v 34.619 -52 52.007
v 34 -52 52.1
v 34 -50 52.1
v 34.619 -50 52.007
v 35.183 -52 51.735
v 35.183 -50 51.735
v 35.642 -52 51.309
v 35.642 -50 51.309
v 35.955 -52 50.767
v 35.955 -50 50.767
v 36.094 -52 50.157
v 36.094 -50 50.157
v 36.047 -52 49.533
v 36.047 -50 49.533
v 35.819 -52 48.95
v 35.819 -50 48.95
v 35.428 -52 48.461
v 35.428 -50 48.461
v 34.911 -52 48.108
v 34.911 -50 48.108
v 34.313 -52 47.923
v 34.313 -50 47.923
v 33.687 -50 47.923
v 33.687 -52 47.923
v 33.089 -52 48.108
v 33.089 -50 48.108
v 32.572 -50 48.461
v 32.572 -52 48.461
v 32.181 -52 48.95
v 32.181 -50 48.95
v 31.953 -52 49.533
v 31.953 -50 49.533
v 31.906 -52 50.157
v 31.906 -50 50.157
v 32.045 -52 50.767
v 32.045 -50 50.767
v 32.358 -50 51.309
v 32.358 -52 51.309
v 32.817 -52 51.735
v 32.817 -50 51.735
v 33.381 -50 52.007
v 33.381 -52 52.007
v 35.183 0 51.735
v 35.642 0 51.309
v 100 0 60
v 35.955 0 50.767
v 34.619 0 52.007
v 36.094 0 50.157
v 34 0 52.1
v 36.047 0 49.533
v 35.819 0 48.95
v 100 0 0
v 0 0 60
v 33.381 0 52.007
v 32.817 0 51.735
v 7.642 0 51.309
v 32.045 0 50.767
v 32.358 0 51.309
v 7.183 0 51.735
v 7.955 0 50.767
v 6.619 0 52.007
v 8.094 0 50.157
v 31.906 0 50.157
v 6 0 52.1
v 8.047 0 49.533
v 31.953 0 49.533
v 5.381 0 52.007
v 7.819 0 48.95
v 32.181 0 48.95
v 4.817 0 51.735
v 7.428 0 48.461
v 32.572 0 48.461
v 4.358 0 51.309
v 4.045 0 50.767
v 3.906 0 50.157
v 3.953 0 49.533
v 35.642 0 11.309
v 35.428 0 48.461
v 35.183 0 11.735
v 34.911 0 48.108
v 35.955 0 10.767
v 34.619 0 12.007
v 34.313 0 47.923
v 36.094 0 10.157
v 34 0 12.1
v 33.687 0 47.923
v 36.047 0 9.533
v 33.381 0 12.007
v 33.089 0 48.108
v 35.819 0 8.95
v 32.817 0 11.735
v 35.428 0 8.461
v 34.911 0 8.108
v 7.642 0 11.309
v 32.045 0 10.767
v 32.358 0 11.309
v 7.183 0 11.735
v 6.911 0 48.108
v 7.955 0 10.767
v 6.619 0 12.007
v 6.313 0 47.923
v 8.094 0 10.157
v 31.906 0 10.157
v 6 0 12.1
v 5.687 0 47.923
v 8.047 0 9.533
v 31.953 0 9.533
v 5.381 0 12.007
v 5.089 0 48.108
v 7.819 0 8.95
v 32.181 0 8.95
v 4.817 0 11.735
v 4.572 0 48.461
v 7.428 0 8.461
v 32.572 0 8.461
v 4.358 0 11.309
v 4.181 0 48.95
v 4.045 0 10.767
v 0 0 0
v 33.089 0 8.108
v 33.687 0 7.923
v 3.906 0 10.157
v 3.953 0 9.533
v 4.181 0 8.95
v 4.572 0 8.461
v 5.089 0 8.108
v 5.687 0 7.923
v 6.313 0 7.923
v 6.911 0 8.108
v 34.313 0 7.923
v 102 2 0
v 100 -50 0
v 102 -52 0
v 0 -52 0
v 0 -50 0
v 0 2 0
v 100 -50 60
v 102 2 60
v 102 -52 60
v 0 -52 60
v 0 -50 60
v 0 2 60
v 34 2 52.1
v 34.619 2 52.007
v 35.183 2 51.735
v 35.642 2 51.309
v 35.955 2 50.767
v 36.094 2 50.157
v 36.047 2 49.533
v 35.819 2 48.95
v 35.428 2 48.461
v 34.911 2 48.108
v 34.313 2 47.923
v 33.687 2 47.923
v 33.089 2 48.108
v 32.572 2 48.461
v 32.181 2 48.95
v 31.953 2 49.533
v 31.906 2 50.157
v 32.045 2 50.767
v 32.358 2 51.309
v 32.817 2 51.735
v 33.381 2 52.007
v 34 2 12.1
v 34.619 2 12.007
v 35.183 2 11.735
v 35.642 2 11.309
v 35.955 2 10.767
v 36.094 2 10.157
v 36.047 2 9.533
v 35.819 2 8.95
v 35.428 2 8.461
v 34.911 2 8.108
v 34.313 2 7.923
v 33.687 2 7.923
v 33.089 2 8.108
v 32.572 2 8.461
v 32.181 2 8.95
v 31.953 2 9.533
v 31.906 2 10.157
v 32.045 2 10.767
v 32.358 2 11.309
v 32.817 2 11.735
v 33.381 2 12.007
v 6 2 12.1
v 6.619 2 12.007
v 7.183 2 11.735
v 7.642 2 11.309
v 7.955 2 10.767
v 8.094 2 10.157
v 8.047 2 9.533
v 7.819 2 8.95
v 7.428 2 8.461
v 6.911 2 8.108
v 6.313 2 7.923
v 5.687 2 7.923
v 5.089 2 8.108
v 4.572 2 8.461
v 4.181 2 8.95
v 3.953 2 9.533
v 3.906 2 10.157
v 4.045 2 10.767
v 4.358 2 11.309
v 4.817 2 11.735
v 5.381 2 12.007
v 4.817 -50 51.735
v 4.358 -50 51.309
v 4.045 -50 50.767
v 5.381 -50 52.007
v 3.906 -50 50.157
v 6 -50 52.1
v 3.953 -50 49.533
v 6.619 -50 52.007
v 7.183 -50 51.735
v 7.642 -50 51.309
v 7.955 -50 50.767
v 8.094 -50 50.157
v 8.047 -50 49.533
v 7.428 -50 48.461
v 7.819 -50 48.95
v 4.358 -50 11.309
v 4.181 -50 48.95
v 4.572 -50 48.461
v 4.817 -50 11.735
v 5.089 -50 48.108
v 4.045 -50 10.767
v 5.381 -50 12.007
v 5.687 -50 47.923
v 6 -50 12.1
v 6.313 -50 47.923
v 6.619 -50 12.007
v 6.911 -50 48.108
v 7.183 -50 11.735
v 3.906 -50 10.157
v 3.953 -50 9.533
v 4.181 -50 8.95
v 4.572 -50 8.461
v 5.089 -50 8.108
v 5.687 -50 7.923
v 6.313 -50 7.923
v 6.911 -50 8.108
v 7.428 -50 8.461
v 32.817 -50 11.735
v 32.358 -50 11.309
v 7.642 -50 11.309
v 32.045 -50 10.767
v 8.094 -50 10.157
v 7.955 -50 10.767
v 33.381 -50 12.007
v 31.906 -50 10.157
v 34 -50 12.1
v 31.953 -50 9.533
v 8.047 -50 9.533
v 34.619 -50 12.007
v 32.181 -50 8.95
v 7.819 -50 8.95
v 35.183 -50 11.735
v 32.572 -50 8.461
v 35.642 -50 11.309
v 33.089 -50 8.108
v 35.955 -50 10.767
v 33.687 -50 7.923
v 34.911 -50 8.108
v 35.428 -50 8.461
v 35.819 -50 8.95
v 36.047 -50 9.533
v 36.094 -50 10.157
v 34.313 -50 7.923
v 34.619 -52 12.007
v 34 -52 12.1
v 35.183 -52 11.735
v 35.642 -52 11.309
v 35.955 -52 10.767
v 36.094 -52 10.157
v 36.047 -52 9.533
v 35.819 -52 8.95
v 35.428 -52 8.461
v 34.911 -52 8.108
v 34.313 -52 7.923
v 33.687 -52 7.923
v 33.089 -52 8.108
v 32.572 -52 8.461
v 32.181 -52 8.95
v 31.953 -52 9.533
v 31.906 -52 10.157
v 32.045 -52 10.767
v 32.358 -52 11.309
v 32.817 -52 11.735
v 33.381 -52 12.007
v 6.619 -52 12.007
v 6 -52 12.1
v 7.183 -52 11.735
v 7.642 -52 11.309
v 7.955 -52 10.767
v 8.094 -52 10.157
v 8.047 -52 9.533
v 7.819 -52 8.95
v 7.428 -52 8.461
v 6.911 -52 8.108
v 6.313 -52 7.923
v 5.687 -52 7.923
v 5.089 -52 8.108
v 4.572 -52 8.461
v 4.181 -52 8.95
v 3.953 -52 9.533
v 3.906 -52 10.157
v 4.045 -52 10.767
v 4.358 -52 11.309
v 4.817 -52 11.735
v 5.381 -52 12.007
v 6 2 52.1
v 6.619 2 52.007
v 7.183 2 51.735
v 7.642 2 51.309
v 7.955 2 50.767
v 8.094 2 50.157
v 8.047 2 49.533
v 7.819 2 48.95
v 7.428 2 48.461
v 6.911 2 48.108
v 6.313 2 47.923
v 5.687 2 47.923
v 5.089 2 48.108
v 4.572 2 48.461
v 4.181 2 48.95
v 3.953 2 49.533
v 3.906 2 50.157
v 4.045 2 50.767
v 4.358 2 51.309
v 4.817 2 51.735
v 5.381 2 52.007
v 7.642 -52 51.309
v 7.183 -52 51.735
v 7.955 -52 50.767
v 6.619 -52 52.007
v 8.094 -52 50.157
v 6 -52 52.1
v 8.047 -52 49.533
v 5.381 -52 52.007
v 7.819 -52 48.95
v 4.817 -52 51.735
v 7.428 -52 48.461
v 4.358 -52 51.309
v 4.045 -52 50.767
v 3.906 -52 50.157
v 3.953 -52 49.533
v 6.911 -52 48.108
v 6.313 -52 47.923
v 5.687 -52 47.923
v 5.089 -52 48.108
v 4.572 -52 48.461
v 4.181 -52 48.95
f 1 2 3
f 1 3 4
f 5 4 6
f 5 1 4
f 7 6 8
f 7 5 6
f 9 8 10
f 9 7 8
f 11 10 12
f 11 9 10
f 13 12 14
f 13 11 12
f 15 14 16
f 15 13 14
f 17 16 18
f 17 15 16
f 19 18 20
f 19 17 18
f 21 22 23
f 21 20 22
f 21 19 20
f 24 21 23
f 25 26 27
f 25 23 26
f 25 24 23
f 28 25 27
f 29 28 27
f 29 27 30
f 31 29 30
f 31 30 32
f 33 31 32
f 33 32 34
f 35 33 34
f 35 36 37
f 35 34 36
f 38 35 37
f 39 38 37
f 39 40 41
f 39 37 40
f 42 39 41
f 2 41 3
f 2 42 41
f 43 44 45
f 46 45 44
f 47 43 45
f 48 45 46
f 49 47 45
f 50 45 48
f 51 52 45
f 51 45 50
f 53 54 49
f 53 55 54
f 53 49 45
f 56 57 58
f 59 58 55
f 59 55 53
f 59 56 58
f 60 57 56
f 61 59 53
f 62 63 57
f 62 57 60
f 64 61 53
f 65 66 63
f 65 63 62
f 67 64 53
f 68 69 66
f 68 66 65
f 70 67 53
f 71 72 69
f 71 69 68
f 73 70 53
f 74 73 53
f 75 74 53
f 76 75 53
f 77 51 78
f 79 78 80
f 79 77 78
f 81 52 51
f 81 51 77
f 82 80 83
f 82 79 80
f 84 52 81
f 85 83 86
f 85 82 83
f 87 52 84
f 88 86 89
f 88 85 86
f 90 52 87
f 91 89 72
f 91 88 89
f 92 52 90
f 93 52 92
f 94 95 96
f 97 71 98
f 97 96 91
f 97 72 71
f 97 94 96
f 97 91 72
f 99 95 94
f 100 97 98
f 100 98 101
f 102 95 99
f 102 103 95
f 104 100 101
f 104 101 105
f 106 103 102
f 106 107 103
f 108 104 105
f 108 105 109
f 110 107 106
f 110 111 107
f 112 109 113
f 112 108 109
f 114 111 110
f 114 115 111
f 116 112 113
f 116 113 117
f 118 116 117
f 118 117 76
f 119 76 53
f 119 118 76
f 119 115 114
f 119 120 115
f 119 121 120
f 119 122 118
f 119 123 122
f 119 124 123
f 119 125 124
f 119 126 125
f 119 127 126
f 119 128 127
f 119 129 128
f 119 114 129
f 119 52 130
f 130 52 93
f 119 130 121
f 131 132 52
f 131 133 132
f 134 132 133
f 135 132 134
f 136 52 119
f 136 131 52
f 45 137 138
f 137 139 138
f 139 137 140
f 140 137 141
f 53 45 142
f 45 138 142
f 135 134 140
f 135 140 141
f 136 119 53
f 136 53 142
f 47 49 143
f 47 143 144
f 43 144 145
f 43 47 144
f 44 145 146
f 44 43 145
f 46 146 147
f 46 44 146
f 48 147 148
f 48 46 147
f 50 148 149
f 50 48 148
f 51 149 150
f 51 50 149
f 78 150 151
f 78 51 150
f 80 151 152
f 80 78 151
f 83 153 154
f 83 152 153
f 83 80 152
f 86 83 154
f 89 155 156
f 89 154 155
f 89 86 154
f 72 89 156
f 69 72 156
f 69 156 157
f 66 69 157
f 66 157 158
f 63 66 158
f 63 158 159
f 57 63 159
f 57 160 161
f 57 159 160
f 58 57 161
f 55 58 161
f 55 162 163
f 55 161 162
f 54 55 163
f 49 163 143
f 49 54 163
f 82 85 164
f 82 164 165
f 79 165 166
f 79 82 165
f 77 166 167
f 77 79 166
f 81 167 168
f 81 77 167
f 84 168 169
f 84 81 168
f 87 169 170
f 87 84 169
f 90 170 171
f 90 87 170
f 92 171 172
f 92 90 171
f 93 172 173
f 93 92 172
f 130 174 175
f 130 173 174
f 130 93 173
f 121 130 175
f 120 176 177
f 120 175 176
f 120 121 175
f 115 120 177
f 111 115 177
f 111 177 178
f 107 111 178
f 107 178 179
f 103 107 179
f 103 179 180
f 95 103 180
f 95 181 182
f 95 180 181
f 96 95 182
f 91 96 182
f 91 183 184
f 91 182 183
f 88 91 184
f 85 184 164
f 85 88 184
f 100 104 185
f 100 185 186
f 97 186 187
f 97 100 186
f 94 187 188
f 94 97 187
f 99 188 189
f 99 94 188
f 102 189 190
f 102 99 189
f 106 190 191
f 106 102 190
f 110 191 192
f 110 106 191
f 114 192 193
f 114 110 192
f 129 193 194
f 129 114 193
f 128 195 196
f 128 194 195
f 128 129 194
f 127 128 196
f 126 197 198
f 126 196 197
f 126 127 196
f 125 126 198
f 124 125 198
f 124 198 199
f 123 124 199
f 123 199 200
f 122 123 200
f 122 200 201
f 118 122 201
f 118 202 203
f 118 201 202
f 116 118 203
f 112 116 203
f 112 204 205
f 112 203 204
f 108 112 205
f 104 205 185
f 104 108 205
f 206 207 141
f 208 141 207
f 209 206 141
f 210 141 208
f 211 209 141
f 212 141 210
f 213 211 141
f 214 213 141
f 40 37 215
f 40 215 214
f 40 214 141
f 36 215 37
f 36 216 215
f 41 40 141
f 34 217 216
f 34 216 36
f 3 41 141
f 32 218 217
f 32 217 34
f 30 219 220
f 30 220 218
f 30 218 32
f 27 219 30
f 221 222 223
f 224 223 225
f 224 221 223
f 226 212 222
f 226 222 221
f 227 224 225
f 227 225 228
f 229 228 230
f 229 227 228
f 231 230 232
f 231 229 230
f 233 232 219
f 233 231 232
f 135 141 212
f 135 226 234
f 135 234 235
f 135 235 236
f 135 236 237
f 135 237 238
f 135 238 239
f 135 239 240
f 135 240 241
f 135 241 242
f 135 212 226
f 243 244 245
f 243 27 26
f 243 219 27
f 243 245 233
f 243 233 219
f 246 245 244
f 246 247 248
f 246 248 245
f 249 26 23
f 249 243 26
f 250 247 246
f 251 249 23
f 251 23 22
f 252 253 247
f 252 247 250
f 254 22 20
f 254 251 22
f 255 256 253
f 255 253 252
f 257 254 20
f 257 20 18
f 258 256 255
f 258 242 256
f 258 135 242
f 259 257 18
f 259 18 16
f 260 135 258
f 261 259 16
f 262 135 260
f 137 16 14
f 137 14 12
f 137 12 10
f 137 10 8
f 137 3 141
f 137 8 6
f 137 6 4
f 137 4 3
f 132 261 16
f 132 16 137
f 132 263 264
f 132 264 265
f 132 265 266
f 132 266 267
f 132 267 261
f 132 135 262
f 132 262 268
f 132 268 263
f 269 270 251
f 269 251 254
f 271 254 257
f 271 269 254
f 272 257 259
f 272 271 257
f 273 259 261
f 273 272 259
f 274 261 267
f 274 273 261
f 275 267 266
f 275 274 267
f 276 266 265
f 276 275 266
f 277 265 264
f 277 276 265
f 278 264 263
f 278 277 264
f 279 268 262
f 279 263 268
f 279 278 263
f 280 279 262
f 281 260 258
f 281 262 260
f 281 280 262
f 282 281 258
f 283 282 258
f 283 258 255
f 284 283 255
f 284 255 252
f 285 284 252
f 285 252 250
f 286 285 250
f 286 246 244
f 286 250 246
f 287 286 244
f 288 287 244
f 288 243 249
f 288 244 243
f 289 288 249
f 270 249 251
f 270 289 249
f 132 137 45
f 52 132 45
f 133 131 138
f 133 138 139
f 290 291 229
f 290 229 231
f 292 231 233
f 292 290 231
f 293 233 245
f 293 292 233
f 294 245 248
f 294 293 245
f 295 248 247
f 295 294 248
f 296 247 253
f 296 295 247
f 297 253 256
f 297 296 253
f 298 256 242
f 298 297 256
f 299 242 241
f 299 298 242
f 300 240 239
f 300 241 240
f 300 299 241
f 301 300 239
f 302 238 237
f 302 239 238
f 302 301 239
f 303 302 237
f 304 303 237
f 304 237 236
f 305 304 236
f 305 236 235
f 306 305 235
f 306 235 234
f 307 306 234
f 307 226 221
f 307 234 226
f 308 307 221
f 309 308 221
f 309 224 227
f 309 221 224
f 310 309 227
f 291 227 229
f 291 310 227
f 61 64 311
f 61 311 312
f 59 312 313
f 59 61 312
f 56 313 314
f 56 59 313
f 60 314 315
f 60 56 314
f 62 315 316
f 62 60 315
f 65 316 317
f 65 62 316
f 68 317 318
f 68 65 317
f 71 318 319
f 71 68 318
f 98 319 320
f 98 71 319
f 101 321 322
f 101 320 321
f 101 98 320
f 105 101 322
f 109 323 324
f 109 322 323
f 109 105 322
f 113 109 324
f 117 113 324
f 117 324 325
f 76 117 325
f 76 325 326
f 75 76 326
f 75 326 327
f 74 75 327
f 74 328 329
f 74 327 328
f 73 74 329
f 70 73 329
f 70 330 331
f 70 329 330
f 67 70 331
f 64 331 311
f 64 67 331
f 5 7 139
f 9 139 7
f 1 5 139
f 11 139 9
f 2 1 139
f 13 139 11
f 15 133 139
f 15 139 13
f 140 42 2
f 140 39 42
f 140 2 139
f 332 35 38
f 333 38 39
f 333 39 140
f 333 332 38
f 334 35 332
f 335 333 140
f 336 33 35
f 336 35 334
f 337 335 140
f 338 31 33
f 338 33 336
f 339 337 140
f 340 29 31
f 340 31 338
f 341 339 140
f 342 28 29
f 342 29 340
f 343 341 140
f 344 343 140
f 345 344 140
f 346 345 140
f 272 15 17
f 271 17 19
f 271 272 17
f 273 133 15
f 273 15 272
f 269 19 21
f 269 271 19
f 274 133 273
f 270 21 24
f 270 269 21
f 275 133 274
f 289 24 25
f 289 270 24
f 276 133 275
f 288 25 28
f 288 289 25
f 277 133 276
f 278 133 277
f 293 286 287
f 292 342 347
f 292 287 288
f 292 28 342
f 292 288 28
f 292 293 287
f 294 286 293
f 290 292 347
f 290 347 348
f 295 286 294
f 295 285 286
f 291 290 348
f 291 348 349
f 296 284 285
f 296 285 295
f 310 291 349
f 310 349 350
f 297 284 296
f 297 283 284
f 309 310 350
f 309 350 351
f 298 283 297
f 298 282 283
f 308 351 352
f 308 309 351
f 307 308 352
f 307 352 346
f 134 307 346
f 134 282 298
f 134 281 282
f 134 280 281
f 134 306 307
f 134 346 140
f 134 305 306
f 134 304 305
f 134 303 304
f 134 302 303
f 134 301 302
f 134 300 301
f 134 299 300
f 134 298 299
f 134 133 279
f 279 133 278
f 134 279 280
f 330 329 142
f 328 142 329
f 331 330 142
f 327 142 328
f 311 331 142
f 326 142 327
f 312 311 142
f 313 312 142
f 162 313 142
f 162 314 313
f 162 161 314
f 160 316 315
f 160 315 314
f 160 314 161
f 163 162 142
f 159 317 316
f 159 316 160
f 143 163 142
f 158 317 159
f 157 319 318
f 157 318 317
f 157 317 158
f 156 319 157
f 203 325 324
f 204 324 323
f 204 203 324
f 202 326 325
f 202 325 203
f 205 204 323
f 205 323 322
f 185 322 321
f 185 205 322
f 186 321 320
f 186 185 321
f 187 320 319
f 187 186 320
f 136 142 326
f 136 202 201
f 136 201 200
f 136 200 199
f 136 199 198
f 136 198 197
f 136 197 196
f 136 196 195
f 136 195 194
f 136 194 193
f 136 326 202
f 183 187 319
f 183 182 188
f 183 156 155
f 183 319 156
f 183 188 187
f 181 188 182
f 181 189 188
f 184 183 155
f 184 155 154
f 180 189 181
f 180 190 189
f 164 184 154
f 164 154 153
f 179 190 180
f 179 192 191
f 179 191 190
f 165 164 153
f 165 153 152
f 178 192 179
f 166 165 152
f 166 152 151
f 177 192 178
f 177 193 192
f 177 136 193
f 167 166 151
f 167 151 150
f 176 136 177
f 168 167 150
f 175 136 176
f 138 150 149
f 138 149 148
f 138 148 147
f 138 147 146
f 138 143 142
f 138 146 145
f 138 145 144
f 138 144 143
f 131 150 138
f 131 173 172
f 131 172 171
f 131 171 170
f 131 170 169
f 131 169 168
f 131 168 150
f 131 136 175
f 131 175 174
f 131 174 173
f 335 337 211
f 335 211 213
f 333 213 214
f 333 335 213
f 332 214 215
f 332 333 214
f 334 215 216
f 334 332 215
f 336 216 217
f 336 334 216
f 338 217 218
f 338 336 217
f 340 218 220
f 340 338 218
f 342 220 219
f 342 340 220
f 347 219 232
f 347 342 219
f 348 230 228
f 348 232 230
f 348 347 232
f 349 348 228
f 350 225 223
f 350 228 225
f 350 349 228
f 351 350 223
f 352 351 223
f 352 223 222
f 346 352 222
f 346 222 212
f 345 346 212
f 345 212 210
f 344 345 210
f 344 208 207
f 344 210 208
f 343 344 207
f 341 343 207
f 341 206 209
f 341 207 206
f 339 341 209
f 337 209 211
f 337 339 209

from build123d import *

# Parameters (mm, degrees)
EXTRUDE_1_DEPTH         = 60
CUT_EXTRUDE1_DEPTH      = 130.259429056
CUT_EXTRUDE1_DEPTH_BACK = 130.259429056
SKETCH1_R               = 2.1


with BuildPart() as part:
    # 草图1 → 凸台-拉伸1 (new body)
    with BuildSketch(Plane.XY):
        Polygon((0, 0), (0, 2), (102, 2), (102, -52), (0, -52), (0, -50), (100, -50), (100, 0), align=None)
    extrude(amount=EXTRUDE_1_DEPTH)

    # Sketch1 → Cut-Extrude1 (cut, two sides: drawn at the far end of the back side and taken through both)
    with BuildSketch(Plane(origin=(0, 0, 0), x_dir=(1, 0, 0), z_dir=(0, 1, 0)).offset(-CUT_EXTRUDE1_DEPTH_BACK)):
        with Locations(Location((6, -10, 0), (0, 0, 270))):
            Circle(SKETCH1_R)
        with Locations(Location((34, -10, 0), (0, 0, 270))):
            Circle(SKETCH1_R)
        with Locations(Location((34, -50, 0), (0, 0, 270))):
            Circle(SKETCH1_R)
        with Locations(Location((6, -50, 0), (0, 0, 270))):
            Circle(SKETCH1_R)
    extrude(amount=CUT_EXTRUDE1_DEPTH + CUT_EXTRUDE1_DEPTH_BACK, mode=Mode.SUBTRACT)


solid = part.part
